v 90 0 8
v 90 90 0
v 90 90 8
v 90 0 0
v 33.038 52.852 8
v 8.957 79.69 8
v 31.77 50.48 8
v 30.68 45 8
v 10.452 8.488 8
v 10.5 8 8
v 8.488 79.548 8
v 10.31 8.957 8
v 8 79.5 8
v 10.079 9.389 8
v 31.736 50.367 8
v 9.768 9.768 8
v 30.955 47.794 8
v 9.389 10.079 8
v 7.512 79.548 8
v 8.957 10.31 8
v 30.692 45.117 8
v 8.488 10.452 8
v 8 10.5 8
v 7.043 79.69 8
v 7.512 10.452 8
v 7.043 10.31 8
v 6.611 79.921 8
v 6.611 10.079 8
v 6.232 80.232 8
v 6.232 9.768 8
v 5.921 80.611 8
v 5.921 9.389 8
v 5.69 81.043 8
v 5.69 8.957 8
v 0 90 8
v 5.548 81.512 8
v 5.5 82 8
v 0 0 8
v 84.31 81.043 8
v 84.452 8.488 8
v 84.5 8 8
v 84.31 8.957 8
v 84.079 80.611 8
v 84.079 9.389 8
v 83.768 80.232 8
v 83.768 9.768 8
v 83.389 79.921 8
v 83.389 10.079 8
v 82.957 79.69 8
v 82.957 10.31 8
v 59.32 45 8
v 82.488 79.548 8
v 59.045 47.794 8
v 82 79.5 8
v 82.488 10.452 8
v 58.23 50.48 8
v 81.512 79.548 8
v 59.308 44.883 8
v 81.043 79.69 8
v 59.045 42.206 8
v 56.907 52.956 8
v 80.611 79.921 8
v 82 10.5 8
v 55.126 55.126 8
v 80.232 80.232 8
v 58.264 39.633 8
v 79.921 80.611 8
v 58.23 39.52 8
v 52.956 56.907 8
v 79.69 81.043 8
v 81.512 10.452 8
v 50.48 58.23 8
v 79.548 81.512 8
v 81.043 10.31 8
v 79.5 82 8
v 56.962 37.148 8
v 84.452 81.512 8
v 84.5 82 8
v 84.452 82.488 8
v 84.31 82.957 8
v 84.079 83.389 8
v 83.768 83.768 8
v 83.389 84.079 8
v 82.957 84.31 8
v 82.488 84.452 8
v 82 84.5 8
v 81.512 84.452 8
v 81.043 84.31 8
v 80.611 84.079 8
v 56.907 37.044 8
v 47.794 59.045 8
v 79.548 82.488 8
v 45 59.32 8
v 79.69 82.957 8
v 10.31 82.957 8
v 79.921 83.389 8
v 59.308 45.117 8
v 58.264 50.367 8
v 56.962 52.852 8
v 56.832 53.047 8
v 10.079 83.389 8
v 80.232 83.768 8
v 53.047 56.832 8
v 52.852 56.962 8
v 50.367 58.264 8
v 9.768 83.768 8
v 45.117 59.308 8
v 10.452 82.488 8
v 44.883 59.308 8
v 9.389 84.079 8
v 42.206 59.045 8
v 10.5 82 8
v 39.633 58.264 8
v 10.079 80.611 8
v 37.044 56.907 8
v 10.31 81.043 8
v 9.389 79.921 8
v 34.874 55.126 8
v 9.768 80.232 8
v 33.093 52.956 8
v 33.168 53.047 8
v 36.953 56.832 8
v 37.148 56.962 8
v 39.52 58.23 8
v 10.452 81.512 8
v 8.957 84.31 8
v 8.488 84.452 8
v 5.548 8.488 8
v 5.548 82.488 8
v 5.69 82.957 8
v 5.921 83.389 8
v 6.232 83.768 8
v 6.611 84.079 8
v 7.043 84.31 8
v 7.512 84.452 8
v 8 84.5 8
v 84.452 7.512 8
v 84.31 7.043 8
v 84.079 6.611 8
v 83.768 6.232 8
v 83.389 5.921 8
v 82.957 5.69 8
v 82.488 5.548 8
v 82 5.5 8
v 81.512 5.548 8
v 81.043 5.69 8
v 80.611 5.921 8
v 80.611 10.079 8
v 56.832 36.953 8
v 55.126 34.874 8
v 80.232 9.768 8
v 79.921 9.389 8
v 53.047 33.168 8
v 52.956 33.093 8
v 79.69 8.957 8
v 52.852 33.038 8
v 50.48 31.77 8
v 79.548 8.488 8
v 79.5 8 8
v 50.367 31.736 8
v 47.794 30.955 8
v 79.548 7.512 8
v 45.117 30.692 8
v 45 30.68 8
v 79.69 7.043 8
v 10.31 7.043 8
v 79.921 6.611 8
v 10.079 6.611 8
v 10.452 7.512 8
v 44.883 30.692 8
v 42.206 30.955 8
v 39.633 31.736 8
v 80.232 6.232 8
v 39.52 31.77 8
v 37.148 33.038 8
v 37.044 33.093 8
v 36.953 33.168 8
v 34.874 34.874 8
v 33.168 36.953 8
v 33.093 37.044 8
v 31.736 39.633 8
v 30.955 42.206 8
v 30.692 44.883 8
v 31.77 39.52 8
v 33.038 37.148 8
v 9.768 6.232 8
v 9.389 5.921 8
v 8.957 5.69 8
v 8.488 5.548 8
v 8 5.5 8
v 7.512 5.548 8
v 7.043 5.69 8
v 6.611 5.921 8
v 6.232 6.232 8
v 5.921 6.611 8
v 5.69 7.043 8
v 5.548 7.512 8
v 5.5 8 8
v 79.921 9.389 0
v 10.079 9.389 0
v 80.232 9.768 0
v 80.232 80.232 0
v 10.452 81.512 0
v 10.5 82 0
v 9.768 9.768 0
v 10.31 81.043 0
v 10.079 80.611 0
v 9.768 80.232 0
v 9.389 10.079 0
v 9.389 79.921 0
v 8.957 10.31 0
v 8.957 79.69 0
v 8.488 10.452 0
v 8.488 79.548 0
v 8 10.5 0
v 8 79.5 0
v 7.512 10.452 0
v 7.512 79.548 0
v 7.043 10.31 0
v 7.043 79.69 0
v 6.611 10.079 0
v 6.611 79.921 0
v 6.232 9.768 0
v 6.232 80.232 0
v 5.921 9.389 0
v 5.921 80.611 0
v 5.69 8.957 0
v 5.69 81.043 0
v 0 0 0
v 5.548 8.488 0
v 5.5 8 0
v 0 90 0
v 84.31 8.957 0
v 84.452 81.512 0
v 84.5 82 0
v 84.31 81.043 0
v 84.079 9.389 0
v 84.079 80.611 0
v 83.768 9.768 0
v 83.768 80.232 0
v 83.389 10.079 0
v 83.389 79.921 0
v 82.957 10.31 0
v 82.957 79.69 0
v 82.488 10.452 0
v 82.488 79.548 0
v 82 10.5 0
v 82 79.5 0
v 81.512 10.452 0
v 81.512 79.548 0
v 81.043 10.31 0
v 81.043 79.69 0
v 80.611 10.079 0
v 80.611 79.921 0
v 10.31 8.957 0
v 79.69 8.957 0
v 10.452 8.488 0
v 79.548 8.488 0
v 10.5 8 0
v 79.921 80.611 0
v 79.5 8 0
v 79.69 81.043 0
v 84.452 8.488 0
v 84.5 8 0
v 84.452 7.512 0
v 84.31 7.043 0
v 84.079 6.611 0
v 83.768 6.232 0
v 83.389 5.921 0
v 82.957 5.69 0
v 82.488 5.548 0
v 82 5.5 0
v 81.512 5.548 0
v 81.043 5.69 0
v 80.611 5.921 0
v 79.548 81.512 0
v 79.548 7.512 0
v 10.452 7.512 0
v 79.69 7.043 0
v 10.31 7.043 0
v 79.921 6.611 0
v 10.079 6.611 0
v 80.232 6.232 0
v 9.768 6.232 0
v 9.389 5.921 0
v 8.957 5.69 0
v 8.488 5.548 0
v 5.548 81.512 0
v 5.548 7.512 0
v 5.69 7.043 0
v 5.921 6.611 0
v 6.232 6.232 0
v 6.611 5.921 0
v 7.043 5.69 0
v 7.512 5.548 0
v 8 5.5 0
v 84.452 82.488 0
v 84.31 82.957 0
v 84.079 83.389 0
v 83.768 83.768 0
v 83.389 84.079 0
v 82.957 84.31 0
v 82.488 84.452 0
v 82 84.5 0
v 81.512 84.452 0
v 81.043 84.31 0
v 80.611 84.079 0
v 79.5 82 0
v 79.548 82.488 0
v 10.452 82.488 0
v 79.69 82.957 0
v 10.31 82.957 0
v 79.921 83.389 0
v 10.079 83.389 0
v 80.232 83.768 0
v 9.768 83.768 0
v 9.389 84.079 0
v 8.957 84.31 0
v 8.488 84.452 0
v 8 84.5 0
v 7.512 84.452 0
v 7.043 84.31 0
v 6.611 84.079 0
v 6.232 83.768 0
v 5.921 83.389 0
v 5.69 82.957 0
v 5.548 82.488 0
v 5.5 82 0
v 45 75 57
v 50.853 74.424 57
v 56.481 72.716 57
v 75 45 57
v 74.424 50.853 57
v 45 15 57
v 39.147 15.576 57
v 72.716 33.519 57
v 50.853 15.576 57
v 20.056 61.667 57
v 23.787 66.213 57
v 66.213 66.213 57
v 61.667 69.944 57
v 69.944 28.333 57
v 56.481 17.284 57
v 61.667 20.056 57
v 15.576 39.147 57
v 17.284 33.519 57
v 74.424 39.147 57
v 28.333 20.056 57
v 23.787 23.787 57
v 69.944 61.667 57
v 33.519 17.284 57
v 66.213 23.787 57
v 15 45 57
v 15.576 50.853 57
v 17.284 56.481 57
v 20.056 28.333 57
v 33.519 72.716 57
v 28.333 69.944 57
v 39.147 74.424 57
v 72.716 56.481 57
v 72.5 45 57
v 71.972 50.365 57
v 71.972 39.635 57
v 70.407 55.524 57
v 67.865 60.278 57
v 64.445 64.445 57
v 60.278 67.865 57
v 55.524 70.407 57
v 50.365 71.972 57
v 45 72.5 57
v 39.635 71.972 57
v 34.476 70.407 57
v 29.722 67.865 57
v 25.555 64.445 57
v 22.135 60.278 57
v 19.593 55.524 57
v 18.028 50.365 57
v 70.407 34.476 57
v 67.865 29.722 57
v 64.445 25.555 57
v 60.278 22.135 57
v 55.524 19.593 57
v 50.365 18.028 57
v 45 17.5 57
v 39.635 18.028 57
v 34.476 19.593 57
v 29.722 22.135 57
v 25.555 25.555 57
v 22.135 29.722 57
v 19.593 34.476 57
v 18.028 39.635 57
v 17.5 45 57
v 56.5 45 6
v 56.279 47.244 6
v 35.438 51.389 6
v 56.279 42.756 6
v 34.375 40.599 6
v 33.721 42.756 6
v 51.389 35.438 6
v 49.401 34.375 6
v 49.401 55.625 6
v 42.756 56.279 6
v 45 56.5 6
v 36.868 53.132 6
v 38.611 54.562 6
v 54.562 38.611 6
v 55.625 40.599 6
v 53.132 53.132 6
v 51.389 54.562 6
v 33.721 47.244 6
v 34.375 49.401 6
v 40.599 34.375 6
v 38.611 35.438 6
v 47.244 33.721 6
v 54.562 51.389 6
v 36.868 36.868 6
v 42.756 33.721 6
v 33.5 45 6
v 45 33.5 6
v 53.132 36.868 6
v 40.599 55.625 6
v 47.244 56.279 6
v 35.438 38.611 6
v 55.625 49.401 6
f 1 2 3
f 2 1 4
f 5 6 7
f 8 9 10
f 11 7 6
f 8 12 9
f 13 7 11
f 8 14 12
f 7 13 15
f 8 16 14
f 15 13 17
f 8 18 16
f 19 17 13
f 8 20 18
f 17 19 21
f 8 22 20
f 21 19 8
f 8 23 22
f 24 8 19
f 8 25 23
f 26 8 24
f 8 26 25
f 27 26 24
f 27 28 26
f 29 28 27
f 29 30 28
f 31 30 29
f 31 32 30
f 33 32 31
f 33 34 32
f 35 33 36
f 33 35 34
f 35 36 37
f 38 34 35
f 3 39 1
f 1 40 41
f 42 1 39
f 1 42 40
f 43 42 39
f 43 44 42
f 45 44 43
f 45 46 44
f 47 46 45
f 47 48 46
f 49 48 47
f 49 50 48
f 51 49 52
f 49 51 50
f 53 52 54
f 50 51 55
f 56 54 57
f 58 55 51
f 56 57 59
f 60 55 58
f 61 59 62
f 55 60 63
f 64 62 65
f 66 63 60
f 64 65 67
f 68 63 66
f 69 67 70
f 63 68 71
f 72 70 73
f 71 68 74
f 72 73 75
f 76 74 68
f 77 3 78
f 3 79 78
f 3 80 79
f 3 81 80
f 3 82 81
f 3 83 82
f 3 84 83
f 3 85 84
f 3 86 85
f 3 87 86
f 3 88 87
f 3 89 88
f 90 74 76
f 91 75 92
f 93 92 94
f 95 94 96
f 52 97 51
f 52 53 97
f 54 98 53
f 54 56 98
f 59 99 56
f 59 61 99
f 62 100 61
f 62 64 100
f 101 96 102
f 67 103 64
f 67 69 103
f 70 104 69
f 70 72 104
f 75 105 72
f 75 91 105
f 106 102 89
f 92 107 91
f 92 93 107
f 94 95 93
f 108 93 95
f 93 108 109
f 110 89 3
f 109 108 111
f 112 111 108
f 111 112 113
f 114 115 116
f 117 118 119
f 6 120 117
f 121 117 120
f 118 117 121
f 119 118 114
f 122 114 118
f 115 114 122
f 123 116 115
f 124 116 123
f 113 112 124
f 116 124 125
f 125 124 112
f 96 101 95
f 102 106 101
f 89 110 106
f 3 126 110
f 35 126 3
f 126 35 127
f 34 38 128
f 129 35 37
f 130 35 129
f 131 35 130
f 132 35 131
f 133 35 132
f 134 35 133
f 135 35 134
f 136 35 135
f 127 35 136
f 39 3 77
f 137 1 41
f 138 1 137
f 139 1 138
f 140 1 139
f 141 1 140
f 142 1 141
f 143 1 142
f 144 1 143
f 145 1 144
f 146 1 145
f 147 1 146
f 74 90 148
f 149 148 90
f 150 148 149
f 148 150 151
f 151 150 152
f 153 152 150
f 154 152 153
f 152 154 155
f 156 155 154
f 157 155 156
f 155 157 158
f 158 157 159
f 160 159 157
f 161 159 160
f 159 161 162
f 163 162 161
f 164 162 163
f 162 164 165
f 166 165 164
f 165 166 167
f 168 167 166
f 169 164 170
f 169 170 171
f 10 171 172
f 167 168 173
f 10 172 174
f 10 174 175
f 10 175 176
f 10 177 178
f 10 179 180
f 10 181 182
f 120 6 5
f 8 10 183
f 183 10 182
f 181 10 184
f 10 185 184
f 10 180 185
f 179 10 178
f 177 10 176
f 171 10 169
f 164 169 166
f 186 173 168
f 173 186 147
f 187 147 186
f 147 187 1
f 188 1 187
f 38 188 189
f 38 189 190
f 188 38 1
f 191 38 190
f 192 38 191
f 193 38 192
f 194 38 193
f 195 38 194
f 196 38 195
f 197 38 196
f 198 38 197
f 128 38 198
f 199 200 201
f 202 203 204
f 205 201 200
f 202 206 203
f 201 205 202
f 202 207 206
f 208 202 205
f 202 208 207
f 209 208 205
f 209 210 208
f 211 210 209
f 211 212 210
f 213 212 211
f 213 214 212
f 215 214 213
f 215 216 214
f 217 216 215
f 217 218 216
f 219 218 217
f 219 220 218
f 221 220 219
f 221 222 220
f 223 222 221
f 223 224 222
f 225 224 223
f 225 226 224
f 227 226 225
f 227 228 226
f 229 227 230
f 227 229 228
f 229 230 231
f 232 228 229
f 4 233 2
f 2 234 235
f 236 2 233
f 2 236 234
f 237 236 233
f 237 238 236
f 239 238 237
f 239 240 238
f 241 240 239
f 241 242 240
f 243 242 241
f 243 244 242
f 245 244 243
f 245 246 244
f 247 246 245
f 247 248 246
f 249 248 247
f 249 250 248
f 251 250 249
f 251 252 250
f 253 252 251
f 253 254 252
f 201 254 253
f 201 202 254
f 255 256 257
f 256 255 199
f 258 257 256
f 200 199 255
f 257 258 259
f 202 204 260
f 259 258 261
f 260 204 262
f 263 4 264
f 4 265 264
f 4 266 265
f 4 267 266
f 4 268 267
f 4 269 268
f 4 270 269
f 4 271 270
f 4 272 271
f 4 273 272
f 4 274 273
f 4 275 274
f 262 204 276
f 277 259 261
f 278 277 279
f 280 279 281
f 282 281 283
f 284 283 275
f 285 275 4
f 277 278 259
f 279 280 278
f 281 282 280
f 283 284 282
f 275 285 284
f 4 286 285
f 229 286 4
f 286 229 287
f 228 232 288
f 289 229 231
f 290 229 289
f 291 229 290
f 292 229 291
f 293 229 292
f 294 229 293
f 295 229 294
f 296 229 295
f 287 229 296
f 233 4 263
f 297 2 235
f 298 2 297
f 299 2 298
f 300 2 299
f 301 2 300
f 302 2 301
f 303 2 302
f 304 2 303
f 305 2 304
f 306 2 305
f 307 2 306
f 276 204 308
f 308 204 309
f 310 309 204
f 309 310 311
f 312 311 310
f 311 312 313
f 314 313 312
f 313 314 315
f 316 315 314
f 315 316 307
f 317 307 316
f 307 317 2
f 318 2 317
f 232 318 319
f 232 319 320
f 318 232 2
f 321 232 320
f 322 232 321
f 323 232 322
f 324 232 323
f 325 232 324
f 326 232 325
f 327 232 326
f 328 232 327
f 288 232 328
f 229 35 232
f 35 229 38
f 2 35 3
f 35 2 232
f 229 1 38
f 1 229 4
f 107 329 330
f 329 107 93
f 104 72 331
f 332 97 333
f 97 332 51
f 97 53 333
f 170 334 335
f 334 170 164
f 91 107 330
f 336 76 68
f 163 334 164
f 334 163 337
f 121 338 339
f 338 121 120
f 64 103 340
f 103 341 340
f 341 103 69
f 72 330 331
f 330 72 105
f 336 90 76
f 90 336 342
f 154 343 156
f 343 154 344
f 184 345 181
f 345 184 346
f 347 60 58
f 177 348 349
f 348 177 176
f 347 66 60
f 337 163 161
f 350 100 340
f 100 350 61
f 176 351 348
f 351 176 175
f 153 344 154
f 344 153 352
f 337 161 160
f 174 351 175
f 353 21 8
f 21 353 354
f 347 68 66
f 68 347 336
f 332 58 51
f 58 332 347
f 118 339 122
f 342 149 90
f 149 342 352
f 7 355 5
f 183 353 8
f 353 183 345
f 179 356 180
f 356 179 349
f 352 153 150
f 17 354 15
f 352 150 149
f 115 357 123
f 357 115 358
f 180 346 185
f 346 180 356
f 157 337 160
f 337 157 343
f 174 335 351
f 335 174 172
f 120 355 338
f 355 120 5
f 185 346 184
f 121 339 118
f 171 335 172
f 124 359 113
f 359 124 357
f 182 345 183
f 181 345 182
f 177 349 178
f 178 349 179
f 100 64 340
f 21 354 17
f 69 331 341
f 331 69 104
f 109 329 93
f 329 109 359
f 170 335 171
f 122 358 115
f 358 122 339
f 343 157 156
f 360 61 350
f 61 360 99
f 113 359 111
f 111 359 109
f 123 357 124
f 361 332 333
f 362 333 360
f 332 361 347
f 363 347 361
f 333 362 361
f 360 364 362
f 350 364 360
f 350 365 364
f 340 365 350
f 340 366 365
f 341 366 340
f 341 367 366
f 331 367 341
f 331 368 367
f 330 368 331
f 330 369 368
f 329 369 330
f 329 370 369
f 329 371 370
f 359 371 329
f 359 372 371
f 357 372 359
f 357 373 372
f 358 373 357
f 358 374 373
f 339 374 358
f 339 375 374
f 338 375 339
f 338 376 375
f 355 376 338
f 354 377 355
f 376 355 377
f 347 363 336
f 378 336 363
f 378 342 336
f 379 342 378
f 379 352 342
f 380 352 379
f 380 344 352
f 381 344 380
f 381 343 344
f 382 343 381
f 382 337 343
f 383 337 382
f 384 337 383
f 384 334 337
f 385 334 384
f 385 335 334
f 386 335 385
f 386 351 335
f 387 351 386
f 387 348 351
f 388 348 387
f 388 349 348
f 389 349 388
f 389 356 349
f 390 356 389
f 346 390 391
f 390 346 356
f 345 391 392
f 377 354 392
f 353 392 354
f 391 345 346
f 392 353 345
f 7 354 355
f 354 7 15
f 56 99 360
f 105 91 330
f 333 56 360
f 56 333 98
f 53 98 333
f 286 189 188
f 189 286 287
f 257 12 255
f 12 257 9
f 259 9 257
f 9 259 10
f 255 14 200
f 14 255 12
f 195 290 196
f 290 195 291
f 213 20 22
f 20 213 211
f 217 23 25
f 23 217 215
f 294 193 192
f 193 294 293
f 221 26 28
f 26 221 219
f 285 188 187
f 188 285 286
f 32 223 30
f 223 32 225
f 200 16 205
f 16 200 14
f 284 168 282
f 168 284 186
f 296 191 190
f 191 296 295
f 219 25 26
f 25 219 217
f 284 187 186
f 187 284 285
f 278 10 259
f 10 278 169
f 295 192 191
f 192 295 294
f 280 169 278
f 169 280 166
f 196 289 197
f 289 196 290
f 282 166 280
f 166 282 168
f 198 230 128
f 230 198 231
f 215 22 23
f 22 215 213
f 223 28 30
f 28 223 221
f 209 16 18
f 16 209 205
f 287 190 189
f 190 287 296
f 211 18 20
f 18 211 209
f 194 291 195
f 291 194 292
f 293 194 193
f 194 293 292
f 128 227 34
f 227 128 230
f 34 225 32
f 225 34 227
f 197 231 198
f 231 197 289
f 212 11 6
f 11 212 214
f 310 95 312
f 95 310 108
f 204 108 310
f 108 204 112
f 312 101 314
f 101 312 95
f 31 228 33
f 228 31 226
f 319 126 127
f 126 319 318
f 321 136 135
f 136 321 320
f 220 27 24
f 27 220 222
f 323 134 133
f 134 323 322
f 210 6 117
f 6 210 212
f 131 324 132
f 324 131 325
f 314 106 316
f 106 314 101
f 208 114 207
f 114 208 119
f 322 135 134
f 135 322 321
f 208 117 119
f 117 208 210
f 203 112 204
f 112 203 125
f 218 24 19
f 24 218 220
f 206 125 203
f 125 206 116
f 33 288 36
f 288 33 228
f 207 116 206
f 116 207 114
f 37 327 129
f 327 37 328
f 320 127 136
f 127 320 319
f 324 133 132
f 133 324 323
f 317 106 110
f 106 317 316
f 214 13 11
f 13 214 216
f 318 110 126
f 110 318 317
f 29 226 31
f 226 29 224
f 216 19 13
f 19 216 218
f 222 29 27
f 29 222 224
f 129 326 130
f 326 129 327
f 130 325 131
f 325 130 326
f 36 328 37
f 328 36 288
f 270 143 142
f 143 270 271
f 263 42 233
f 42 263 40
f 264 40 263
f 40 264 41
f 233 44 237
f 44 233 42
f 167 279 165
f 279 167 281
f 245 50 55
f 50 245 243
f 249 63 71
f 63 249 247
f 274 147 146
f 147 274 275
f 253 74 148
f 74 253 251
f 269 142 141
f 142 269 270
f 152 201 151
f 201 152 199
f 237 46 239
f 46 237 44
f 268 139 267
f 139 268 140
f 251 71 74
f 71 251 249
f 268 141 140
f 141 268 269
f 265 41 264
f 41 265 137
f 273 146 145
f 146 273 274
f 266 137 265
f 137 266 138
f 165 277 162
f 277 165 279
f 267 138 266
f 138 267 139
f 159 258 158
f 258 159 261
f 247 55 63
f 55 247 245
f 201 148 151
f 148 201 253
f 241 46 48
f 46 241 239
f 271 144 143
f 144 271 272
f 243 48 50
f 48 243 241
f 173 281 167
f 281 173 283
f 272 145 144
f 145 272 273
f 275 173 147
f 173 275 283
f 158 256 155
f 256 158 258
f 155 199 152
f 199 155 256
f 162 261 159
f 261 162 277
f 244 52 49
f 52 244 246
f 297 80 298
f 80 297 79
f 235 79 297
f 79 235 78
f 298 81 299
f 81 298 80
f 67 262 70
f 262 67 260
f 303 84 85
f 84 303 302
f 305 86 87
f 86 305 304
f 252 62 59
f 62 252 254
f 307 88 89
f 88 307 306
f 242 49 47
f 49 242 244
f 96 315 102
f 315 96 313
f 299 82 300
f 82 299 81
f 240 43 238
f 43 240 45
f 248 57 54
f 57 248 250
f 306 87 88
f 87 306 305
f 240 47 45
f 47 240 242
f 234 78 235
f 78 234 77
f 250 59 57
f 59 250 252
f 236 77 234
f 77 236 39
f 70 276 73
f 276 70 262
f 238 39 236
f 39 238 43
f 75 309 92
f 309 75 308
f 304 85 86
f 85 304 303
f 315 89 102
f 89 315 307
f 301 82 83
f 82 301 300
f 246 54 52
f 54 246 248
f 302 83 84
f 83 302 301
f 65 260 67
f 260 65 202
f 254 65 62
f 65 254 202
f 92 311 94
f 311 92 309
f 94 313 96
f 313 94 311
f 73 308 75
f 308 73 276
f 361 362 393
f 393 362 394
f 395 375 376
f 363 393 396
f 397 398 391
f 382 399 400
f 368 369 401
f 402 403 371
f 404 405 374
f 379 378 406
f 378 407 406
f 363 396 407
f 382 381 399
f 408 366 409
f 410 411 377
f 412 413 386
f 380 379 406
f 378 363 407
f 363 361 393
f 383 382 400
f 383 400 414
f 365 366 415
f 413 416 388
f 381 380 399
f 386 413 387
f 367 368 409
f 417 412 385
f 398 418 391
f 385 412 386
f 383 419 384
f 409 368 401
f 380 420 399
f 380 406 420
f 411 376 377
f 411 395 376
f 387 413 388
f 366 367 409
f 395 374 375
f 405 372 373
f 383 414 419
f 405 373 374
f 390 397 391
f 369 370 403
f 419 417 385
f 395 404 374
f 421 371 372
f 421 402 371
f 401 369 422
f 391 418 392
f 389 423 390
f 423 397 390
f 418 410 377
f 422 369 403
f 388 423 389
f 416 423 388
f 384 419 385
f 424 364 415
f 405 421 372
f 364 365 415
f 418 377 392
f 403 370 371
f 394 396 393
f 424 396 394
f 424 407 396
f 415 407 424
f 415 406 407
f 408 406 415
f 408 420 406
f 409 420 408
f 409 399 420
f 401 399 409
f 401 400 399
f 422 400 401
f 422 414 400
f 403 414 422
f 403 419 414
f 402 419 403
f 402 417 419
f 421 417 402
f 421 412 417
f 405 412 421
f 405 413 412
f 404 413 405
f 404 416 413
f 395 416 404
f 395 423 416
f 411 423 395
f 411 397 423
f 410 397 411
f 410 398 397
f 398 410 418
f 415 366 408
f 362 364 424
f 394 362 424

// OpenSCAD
$fn = 32;

// ----------------------------------------------------------------------
// Hopper: flanged with square flange
// ----------------------------------------------------------------------

// --- parameters (mm) ---
fl = 90;                  // flange side, X and Y
fl_t = 8;                 // flange thickness
cone_h = 50;              // cone height above the flange
top_d = 60;               // cone mouth diameter
bot_d = 28;               // cone spout diameter
wall = 2.5;               // cone wall thickness
hole_r = 2.5;             // flange hole radius
hole_in = 8;              // hole inset from the corners

bore_d = bot_d - 2 * wall;  // spout bore diameter
total_h = fl_t + cone_h - 1;  // overall height

difference() {
  union() {
    cube([fl, fl, fl_t]);
    translate([fl / 2, fl / 2, fl_t - 1])
      cylinder(h = cone_h, d1 = bot_d, d2 = top_d);
  }
  translate([fl / 2, fl / 2, fl_t - 2])
    cylinder(h = cone_h + 1, d1 = bore_d, d2 = top_d - 2 * wall);
  for (sx = [0, 1], sy = [0, 1])
    translate([sx ? fl - hole_in : hole_in,
               sy ? fl - hole_in : hole_in, -1])
      cylinder(r = hole_r, h = fl_t + 2);
}
